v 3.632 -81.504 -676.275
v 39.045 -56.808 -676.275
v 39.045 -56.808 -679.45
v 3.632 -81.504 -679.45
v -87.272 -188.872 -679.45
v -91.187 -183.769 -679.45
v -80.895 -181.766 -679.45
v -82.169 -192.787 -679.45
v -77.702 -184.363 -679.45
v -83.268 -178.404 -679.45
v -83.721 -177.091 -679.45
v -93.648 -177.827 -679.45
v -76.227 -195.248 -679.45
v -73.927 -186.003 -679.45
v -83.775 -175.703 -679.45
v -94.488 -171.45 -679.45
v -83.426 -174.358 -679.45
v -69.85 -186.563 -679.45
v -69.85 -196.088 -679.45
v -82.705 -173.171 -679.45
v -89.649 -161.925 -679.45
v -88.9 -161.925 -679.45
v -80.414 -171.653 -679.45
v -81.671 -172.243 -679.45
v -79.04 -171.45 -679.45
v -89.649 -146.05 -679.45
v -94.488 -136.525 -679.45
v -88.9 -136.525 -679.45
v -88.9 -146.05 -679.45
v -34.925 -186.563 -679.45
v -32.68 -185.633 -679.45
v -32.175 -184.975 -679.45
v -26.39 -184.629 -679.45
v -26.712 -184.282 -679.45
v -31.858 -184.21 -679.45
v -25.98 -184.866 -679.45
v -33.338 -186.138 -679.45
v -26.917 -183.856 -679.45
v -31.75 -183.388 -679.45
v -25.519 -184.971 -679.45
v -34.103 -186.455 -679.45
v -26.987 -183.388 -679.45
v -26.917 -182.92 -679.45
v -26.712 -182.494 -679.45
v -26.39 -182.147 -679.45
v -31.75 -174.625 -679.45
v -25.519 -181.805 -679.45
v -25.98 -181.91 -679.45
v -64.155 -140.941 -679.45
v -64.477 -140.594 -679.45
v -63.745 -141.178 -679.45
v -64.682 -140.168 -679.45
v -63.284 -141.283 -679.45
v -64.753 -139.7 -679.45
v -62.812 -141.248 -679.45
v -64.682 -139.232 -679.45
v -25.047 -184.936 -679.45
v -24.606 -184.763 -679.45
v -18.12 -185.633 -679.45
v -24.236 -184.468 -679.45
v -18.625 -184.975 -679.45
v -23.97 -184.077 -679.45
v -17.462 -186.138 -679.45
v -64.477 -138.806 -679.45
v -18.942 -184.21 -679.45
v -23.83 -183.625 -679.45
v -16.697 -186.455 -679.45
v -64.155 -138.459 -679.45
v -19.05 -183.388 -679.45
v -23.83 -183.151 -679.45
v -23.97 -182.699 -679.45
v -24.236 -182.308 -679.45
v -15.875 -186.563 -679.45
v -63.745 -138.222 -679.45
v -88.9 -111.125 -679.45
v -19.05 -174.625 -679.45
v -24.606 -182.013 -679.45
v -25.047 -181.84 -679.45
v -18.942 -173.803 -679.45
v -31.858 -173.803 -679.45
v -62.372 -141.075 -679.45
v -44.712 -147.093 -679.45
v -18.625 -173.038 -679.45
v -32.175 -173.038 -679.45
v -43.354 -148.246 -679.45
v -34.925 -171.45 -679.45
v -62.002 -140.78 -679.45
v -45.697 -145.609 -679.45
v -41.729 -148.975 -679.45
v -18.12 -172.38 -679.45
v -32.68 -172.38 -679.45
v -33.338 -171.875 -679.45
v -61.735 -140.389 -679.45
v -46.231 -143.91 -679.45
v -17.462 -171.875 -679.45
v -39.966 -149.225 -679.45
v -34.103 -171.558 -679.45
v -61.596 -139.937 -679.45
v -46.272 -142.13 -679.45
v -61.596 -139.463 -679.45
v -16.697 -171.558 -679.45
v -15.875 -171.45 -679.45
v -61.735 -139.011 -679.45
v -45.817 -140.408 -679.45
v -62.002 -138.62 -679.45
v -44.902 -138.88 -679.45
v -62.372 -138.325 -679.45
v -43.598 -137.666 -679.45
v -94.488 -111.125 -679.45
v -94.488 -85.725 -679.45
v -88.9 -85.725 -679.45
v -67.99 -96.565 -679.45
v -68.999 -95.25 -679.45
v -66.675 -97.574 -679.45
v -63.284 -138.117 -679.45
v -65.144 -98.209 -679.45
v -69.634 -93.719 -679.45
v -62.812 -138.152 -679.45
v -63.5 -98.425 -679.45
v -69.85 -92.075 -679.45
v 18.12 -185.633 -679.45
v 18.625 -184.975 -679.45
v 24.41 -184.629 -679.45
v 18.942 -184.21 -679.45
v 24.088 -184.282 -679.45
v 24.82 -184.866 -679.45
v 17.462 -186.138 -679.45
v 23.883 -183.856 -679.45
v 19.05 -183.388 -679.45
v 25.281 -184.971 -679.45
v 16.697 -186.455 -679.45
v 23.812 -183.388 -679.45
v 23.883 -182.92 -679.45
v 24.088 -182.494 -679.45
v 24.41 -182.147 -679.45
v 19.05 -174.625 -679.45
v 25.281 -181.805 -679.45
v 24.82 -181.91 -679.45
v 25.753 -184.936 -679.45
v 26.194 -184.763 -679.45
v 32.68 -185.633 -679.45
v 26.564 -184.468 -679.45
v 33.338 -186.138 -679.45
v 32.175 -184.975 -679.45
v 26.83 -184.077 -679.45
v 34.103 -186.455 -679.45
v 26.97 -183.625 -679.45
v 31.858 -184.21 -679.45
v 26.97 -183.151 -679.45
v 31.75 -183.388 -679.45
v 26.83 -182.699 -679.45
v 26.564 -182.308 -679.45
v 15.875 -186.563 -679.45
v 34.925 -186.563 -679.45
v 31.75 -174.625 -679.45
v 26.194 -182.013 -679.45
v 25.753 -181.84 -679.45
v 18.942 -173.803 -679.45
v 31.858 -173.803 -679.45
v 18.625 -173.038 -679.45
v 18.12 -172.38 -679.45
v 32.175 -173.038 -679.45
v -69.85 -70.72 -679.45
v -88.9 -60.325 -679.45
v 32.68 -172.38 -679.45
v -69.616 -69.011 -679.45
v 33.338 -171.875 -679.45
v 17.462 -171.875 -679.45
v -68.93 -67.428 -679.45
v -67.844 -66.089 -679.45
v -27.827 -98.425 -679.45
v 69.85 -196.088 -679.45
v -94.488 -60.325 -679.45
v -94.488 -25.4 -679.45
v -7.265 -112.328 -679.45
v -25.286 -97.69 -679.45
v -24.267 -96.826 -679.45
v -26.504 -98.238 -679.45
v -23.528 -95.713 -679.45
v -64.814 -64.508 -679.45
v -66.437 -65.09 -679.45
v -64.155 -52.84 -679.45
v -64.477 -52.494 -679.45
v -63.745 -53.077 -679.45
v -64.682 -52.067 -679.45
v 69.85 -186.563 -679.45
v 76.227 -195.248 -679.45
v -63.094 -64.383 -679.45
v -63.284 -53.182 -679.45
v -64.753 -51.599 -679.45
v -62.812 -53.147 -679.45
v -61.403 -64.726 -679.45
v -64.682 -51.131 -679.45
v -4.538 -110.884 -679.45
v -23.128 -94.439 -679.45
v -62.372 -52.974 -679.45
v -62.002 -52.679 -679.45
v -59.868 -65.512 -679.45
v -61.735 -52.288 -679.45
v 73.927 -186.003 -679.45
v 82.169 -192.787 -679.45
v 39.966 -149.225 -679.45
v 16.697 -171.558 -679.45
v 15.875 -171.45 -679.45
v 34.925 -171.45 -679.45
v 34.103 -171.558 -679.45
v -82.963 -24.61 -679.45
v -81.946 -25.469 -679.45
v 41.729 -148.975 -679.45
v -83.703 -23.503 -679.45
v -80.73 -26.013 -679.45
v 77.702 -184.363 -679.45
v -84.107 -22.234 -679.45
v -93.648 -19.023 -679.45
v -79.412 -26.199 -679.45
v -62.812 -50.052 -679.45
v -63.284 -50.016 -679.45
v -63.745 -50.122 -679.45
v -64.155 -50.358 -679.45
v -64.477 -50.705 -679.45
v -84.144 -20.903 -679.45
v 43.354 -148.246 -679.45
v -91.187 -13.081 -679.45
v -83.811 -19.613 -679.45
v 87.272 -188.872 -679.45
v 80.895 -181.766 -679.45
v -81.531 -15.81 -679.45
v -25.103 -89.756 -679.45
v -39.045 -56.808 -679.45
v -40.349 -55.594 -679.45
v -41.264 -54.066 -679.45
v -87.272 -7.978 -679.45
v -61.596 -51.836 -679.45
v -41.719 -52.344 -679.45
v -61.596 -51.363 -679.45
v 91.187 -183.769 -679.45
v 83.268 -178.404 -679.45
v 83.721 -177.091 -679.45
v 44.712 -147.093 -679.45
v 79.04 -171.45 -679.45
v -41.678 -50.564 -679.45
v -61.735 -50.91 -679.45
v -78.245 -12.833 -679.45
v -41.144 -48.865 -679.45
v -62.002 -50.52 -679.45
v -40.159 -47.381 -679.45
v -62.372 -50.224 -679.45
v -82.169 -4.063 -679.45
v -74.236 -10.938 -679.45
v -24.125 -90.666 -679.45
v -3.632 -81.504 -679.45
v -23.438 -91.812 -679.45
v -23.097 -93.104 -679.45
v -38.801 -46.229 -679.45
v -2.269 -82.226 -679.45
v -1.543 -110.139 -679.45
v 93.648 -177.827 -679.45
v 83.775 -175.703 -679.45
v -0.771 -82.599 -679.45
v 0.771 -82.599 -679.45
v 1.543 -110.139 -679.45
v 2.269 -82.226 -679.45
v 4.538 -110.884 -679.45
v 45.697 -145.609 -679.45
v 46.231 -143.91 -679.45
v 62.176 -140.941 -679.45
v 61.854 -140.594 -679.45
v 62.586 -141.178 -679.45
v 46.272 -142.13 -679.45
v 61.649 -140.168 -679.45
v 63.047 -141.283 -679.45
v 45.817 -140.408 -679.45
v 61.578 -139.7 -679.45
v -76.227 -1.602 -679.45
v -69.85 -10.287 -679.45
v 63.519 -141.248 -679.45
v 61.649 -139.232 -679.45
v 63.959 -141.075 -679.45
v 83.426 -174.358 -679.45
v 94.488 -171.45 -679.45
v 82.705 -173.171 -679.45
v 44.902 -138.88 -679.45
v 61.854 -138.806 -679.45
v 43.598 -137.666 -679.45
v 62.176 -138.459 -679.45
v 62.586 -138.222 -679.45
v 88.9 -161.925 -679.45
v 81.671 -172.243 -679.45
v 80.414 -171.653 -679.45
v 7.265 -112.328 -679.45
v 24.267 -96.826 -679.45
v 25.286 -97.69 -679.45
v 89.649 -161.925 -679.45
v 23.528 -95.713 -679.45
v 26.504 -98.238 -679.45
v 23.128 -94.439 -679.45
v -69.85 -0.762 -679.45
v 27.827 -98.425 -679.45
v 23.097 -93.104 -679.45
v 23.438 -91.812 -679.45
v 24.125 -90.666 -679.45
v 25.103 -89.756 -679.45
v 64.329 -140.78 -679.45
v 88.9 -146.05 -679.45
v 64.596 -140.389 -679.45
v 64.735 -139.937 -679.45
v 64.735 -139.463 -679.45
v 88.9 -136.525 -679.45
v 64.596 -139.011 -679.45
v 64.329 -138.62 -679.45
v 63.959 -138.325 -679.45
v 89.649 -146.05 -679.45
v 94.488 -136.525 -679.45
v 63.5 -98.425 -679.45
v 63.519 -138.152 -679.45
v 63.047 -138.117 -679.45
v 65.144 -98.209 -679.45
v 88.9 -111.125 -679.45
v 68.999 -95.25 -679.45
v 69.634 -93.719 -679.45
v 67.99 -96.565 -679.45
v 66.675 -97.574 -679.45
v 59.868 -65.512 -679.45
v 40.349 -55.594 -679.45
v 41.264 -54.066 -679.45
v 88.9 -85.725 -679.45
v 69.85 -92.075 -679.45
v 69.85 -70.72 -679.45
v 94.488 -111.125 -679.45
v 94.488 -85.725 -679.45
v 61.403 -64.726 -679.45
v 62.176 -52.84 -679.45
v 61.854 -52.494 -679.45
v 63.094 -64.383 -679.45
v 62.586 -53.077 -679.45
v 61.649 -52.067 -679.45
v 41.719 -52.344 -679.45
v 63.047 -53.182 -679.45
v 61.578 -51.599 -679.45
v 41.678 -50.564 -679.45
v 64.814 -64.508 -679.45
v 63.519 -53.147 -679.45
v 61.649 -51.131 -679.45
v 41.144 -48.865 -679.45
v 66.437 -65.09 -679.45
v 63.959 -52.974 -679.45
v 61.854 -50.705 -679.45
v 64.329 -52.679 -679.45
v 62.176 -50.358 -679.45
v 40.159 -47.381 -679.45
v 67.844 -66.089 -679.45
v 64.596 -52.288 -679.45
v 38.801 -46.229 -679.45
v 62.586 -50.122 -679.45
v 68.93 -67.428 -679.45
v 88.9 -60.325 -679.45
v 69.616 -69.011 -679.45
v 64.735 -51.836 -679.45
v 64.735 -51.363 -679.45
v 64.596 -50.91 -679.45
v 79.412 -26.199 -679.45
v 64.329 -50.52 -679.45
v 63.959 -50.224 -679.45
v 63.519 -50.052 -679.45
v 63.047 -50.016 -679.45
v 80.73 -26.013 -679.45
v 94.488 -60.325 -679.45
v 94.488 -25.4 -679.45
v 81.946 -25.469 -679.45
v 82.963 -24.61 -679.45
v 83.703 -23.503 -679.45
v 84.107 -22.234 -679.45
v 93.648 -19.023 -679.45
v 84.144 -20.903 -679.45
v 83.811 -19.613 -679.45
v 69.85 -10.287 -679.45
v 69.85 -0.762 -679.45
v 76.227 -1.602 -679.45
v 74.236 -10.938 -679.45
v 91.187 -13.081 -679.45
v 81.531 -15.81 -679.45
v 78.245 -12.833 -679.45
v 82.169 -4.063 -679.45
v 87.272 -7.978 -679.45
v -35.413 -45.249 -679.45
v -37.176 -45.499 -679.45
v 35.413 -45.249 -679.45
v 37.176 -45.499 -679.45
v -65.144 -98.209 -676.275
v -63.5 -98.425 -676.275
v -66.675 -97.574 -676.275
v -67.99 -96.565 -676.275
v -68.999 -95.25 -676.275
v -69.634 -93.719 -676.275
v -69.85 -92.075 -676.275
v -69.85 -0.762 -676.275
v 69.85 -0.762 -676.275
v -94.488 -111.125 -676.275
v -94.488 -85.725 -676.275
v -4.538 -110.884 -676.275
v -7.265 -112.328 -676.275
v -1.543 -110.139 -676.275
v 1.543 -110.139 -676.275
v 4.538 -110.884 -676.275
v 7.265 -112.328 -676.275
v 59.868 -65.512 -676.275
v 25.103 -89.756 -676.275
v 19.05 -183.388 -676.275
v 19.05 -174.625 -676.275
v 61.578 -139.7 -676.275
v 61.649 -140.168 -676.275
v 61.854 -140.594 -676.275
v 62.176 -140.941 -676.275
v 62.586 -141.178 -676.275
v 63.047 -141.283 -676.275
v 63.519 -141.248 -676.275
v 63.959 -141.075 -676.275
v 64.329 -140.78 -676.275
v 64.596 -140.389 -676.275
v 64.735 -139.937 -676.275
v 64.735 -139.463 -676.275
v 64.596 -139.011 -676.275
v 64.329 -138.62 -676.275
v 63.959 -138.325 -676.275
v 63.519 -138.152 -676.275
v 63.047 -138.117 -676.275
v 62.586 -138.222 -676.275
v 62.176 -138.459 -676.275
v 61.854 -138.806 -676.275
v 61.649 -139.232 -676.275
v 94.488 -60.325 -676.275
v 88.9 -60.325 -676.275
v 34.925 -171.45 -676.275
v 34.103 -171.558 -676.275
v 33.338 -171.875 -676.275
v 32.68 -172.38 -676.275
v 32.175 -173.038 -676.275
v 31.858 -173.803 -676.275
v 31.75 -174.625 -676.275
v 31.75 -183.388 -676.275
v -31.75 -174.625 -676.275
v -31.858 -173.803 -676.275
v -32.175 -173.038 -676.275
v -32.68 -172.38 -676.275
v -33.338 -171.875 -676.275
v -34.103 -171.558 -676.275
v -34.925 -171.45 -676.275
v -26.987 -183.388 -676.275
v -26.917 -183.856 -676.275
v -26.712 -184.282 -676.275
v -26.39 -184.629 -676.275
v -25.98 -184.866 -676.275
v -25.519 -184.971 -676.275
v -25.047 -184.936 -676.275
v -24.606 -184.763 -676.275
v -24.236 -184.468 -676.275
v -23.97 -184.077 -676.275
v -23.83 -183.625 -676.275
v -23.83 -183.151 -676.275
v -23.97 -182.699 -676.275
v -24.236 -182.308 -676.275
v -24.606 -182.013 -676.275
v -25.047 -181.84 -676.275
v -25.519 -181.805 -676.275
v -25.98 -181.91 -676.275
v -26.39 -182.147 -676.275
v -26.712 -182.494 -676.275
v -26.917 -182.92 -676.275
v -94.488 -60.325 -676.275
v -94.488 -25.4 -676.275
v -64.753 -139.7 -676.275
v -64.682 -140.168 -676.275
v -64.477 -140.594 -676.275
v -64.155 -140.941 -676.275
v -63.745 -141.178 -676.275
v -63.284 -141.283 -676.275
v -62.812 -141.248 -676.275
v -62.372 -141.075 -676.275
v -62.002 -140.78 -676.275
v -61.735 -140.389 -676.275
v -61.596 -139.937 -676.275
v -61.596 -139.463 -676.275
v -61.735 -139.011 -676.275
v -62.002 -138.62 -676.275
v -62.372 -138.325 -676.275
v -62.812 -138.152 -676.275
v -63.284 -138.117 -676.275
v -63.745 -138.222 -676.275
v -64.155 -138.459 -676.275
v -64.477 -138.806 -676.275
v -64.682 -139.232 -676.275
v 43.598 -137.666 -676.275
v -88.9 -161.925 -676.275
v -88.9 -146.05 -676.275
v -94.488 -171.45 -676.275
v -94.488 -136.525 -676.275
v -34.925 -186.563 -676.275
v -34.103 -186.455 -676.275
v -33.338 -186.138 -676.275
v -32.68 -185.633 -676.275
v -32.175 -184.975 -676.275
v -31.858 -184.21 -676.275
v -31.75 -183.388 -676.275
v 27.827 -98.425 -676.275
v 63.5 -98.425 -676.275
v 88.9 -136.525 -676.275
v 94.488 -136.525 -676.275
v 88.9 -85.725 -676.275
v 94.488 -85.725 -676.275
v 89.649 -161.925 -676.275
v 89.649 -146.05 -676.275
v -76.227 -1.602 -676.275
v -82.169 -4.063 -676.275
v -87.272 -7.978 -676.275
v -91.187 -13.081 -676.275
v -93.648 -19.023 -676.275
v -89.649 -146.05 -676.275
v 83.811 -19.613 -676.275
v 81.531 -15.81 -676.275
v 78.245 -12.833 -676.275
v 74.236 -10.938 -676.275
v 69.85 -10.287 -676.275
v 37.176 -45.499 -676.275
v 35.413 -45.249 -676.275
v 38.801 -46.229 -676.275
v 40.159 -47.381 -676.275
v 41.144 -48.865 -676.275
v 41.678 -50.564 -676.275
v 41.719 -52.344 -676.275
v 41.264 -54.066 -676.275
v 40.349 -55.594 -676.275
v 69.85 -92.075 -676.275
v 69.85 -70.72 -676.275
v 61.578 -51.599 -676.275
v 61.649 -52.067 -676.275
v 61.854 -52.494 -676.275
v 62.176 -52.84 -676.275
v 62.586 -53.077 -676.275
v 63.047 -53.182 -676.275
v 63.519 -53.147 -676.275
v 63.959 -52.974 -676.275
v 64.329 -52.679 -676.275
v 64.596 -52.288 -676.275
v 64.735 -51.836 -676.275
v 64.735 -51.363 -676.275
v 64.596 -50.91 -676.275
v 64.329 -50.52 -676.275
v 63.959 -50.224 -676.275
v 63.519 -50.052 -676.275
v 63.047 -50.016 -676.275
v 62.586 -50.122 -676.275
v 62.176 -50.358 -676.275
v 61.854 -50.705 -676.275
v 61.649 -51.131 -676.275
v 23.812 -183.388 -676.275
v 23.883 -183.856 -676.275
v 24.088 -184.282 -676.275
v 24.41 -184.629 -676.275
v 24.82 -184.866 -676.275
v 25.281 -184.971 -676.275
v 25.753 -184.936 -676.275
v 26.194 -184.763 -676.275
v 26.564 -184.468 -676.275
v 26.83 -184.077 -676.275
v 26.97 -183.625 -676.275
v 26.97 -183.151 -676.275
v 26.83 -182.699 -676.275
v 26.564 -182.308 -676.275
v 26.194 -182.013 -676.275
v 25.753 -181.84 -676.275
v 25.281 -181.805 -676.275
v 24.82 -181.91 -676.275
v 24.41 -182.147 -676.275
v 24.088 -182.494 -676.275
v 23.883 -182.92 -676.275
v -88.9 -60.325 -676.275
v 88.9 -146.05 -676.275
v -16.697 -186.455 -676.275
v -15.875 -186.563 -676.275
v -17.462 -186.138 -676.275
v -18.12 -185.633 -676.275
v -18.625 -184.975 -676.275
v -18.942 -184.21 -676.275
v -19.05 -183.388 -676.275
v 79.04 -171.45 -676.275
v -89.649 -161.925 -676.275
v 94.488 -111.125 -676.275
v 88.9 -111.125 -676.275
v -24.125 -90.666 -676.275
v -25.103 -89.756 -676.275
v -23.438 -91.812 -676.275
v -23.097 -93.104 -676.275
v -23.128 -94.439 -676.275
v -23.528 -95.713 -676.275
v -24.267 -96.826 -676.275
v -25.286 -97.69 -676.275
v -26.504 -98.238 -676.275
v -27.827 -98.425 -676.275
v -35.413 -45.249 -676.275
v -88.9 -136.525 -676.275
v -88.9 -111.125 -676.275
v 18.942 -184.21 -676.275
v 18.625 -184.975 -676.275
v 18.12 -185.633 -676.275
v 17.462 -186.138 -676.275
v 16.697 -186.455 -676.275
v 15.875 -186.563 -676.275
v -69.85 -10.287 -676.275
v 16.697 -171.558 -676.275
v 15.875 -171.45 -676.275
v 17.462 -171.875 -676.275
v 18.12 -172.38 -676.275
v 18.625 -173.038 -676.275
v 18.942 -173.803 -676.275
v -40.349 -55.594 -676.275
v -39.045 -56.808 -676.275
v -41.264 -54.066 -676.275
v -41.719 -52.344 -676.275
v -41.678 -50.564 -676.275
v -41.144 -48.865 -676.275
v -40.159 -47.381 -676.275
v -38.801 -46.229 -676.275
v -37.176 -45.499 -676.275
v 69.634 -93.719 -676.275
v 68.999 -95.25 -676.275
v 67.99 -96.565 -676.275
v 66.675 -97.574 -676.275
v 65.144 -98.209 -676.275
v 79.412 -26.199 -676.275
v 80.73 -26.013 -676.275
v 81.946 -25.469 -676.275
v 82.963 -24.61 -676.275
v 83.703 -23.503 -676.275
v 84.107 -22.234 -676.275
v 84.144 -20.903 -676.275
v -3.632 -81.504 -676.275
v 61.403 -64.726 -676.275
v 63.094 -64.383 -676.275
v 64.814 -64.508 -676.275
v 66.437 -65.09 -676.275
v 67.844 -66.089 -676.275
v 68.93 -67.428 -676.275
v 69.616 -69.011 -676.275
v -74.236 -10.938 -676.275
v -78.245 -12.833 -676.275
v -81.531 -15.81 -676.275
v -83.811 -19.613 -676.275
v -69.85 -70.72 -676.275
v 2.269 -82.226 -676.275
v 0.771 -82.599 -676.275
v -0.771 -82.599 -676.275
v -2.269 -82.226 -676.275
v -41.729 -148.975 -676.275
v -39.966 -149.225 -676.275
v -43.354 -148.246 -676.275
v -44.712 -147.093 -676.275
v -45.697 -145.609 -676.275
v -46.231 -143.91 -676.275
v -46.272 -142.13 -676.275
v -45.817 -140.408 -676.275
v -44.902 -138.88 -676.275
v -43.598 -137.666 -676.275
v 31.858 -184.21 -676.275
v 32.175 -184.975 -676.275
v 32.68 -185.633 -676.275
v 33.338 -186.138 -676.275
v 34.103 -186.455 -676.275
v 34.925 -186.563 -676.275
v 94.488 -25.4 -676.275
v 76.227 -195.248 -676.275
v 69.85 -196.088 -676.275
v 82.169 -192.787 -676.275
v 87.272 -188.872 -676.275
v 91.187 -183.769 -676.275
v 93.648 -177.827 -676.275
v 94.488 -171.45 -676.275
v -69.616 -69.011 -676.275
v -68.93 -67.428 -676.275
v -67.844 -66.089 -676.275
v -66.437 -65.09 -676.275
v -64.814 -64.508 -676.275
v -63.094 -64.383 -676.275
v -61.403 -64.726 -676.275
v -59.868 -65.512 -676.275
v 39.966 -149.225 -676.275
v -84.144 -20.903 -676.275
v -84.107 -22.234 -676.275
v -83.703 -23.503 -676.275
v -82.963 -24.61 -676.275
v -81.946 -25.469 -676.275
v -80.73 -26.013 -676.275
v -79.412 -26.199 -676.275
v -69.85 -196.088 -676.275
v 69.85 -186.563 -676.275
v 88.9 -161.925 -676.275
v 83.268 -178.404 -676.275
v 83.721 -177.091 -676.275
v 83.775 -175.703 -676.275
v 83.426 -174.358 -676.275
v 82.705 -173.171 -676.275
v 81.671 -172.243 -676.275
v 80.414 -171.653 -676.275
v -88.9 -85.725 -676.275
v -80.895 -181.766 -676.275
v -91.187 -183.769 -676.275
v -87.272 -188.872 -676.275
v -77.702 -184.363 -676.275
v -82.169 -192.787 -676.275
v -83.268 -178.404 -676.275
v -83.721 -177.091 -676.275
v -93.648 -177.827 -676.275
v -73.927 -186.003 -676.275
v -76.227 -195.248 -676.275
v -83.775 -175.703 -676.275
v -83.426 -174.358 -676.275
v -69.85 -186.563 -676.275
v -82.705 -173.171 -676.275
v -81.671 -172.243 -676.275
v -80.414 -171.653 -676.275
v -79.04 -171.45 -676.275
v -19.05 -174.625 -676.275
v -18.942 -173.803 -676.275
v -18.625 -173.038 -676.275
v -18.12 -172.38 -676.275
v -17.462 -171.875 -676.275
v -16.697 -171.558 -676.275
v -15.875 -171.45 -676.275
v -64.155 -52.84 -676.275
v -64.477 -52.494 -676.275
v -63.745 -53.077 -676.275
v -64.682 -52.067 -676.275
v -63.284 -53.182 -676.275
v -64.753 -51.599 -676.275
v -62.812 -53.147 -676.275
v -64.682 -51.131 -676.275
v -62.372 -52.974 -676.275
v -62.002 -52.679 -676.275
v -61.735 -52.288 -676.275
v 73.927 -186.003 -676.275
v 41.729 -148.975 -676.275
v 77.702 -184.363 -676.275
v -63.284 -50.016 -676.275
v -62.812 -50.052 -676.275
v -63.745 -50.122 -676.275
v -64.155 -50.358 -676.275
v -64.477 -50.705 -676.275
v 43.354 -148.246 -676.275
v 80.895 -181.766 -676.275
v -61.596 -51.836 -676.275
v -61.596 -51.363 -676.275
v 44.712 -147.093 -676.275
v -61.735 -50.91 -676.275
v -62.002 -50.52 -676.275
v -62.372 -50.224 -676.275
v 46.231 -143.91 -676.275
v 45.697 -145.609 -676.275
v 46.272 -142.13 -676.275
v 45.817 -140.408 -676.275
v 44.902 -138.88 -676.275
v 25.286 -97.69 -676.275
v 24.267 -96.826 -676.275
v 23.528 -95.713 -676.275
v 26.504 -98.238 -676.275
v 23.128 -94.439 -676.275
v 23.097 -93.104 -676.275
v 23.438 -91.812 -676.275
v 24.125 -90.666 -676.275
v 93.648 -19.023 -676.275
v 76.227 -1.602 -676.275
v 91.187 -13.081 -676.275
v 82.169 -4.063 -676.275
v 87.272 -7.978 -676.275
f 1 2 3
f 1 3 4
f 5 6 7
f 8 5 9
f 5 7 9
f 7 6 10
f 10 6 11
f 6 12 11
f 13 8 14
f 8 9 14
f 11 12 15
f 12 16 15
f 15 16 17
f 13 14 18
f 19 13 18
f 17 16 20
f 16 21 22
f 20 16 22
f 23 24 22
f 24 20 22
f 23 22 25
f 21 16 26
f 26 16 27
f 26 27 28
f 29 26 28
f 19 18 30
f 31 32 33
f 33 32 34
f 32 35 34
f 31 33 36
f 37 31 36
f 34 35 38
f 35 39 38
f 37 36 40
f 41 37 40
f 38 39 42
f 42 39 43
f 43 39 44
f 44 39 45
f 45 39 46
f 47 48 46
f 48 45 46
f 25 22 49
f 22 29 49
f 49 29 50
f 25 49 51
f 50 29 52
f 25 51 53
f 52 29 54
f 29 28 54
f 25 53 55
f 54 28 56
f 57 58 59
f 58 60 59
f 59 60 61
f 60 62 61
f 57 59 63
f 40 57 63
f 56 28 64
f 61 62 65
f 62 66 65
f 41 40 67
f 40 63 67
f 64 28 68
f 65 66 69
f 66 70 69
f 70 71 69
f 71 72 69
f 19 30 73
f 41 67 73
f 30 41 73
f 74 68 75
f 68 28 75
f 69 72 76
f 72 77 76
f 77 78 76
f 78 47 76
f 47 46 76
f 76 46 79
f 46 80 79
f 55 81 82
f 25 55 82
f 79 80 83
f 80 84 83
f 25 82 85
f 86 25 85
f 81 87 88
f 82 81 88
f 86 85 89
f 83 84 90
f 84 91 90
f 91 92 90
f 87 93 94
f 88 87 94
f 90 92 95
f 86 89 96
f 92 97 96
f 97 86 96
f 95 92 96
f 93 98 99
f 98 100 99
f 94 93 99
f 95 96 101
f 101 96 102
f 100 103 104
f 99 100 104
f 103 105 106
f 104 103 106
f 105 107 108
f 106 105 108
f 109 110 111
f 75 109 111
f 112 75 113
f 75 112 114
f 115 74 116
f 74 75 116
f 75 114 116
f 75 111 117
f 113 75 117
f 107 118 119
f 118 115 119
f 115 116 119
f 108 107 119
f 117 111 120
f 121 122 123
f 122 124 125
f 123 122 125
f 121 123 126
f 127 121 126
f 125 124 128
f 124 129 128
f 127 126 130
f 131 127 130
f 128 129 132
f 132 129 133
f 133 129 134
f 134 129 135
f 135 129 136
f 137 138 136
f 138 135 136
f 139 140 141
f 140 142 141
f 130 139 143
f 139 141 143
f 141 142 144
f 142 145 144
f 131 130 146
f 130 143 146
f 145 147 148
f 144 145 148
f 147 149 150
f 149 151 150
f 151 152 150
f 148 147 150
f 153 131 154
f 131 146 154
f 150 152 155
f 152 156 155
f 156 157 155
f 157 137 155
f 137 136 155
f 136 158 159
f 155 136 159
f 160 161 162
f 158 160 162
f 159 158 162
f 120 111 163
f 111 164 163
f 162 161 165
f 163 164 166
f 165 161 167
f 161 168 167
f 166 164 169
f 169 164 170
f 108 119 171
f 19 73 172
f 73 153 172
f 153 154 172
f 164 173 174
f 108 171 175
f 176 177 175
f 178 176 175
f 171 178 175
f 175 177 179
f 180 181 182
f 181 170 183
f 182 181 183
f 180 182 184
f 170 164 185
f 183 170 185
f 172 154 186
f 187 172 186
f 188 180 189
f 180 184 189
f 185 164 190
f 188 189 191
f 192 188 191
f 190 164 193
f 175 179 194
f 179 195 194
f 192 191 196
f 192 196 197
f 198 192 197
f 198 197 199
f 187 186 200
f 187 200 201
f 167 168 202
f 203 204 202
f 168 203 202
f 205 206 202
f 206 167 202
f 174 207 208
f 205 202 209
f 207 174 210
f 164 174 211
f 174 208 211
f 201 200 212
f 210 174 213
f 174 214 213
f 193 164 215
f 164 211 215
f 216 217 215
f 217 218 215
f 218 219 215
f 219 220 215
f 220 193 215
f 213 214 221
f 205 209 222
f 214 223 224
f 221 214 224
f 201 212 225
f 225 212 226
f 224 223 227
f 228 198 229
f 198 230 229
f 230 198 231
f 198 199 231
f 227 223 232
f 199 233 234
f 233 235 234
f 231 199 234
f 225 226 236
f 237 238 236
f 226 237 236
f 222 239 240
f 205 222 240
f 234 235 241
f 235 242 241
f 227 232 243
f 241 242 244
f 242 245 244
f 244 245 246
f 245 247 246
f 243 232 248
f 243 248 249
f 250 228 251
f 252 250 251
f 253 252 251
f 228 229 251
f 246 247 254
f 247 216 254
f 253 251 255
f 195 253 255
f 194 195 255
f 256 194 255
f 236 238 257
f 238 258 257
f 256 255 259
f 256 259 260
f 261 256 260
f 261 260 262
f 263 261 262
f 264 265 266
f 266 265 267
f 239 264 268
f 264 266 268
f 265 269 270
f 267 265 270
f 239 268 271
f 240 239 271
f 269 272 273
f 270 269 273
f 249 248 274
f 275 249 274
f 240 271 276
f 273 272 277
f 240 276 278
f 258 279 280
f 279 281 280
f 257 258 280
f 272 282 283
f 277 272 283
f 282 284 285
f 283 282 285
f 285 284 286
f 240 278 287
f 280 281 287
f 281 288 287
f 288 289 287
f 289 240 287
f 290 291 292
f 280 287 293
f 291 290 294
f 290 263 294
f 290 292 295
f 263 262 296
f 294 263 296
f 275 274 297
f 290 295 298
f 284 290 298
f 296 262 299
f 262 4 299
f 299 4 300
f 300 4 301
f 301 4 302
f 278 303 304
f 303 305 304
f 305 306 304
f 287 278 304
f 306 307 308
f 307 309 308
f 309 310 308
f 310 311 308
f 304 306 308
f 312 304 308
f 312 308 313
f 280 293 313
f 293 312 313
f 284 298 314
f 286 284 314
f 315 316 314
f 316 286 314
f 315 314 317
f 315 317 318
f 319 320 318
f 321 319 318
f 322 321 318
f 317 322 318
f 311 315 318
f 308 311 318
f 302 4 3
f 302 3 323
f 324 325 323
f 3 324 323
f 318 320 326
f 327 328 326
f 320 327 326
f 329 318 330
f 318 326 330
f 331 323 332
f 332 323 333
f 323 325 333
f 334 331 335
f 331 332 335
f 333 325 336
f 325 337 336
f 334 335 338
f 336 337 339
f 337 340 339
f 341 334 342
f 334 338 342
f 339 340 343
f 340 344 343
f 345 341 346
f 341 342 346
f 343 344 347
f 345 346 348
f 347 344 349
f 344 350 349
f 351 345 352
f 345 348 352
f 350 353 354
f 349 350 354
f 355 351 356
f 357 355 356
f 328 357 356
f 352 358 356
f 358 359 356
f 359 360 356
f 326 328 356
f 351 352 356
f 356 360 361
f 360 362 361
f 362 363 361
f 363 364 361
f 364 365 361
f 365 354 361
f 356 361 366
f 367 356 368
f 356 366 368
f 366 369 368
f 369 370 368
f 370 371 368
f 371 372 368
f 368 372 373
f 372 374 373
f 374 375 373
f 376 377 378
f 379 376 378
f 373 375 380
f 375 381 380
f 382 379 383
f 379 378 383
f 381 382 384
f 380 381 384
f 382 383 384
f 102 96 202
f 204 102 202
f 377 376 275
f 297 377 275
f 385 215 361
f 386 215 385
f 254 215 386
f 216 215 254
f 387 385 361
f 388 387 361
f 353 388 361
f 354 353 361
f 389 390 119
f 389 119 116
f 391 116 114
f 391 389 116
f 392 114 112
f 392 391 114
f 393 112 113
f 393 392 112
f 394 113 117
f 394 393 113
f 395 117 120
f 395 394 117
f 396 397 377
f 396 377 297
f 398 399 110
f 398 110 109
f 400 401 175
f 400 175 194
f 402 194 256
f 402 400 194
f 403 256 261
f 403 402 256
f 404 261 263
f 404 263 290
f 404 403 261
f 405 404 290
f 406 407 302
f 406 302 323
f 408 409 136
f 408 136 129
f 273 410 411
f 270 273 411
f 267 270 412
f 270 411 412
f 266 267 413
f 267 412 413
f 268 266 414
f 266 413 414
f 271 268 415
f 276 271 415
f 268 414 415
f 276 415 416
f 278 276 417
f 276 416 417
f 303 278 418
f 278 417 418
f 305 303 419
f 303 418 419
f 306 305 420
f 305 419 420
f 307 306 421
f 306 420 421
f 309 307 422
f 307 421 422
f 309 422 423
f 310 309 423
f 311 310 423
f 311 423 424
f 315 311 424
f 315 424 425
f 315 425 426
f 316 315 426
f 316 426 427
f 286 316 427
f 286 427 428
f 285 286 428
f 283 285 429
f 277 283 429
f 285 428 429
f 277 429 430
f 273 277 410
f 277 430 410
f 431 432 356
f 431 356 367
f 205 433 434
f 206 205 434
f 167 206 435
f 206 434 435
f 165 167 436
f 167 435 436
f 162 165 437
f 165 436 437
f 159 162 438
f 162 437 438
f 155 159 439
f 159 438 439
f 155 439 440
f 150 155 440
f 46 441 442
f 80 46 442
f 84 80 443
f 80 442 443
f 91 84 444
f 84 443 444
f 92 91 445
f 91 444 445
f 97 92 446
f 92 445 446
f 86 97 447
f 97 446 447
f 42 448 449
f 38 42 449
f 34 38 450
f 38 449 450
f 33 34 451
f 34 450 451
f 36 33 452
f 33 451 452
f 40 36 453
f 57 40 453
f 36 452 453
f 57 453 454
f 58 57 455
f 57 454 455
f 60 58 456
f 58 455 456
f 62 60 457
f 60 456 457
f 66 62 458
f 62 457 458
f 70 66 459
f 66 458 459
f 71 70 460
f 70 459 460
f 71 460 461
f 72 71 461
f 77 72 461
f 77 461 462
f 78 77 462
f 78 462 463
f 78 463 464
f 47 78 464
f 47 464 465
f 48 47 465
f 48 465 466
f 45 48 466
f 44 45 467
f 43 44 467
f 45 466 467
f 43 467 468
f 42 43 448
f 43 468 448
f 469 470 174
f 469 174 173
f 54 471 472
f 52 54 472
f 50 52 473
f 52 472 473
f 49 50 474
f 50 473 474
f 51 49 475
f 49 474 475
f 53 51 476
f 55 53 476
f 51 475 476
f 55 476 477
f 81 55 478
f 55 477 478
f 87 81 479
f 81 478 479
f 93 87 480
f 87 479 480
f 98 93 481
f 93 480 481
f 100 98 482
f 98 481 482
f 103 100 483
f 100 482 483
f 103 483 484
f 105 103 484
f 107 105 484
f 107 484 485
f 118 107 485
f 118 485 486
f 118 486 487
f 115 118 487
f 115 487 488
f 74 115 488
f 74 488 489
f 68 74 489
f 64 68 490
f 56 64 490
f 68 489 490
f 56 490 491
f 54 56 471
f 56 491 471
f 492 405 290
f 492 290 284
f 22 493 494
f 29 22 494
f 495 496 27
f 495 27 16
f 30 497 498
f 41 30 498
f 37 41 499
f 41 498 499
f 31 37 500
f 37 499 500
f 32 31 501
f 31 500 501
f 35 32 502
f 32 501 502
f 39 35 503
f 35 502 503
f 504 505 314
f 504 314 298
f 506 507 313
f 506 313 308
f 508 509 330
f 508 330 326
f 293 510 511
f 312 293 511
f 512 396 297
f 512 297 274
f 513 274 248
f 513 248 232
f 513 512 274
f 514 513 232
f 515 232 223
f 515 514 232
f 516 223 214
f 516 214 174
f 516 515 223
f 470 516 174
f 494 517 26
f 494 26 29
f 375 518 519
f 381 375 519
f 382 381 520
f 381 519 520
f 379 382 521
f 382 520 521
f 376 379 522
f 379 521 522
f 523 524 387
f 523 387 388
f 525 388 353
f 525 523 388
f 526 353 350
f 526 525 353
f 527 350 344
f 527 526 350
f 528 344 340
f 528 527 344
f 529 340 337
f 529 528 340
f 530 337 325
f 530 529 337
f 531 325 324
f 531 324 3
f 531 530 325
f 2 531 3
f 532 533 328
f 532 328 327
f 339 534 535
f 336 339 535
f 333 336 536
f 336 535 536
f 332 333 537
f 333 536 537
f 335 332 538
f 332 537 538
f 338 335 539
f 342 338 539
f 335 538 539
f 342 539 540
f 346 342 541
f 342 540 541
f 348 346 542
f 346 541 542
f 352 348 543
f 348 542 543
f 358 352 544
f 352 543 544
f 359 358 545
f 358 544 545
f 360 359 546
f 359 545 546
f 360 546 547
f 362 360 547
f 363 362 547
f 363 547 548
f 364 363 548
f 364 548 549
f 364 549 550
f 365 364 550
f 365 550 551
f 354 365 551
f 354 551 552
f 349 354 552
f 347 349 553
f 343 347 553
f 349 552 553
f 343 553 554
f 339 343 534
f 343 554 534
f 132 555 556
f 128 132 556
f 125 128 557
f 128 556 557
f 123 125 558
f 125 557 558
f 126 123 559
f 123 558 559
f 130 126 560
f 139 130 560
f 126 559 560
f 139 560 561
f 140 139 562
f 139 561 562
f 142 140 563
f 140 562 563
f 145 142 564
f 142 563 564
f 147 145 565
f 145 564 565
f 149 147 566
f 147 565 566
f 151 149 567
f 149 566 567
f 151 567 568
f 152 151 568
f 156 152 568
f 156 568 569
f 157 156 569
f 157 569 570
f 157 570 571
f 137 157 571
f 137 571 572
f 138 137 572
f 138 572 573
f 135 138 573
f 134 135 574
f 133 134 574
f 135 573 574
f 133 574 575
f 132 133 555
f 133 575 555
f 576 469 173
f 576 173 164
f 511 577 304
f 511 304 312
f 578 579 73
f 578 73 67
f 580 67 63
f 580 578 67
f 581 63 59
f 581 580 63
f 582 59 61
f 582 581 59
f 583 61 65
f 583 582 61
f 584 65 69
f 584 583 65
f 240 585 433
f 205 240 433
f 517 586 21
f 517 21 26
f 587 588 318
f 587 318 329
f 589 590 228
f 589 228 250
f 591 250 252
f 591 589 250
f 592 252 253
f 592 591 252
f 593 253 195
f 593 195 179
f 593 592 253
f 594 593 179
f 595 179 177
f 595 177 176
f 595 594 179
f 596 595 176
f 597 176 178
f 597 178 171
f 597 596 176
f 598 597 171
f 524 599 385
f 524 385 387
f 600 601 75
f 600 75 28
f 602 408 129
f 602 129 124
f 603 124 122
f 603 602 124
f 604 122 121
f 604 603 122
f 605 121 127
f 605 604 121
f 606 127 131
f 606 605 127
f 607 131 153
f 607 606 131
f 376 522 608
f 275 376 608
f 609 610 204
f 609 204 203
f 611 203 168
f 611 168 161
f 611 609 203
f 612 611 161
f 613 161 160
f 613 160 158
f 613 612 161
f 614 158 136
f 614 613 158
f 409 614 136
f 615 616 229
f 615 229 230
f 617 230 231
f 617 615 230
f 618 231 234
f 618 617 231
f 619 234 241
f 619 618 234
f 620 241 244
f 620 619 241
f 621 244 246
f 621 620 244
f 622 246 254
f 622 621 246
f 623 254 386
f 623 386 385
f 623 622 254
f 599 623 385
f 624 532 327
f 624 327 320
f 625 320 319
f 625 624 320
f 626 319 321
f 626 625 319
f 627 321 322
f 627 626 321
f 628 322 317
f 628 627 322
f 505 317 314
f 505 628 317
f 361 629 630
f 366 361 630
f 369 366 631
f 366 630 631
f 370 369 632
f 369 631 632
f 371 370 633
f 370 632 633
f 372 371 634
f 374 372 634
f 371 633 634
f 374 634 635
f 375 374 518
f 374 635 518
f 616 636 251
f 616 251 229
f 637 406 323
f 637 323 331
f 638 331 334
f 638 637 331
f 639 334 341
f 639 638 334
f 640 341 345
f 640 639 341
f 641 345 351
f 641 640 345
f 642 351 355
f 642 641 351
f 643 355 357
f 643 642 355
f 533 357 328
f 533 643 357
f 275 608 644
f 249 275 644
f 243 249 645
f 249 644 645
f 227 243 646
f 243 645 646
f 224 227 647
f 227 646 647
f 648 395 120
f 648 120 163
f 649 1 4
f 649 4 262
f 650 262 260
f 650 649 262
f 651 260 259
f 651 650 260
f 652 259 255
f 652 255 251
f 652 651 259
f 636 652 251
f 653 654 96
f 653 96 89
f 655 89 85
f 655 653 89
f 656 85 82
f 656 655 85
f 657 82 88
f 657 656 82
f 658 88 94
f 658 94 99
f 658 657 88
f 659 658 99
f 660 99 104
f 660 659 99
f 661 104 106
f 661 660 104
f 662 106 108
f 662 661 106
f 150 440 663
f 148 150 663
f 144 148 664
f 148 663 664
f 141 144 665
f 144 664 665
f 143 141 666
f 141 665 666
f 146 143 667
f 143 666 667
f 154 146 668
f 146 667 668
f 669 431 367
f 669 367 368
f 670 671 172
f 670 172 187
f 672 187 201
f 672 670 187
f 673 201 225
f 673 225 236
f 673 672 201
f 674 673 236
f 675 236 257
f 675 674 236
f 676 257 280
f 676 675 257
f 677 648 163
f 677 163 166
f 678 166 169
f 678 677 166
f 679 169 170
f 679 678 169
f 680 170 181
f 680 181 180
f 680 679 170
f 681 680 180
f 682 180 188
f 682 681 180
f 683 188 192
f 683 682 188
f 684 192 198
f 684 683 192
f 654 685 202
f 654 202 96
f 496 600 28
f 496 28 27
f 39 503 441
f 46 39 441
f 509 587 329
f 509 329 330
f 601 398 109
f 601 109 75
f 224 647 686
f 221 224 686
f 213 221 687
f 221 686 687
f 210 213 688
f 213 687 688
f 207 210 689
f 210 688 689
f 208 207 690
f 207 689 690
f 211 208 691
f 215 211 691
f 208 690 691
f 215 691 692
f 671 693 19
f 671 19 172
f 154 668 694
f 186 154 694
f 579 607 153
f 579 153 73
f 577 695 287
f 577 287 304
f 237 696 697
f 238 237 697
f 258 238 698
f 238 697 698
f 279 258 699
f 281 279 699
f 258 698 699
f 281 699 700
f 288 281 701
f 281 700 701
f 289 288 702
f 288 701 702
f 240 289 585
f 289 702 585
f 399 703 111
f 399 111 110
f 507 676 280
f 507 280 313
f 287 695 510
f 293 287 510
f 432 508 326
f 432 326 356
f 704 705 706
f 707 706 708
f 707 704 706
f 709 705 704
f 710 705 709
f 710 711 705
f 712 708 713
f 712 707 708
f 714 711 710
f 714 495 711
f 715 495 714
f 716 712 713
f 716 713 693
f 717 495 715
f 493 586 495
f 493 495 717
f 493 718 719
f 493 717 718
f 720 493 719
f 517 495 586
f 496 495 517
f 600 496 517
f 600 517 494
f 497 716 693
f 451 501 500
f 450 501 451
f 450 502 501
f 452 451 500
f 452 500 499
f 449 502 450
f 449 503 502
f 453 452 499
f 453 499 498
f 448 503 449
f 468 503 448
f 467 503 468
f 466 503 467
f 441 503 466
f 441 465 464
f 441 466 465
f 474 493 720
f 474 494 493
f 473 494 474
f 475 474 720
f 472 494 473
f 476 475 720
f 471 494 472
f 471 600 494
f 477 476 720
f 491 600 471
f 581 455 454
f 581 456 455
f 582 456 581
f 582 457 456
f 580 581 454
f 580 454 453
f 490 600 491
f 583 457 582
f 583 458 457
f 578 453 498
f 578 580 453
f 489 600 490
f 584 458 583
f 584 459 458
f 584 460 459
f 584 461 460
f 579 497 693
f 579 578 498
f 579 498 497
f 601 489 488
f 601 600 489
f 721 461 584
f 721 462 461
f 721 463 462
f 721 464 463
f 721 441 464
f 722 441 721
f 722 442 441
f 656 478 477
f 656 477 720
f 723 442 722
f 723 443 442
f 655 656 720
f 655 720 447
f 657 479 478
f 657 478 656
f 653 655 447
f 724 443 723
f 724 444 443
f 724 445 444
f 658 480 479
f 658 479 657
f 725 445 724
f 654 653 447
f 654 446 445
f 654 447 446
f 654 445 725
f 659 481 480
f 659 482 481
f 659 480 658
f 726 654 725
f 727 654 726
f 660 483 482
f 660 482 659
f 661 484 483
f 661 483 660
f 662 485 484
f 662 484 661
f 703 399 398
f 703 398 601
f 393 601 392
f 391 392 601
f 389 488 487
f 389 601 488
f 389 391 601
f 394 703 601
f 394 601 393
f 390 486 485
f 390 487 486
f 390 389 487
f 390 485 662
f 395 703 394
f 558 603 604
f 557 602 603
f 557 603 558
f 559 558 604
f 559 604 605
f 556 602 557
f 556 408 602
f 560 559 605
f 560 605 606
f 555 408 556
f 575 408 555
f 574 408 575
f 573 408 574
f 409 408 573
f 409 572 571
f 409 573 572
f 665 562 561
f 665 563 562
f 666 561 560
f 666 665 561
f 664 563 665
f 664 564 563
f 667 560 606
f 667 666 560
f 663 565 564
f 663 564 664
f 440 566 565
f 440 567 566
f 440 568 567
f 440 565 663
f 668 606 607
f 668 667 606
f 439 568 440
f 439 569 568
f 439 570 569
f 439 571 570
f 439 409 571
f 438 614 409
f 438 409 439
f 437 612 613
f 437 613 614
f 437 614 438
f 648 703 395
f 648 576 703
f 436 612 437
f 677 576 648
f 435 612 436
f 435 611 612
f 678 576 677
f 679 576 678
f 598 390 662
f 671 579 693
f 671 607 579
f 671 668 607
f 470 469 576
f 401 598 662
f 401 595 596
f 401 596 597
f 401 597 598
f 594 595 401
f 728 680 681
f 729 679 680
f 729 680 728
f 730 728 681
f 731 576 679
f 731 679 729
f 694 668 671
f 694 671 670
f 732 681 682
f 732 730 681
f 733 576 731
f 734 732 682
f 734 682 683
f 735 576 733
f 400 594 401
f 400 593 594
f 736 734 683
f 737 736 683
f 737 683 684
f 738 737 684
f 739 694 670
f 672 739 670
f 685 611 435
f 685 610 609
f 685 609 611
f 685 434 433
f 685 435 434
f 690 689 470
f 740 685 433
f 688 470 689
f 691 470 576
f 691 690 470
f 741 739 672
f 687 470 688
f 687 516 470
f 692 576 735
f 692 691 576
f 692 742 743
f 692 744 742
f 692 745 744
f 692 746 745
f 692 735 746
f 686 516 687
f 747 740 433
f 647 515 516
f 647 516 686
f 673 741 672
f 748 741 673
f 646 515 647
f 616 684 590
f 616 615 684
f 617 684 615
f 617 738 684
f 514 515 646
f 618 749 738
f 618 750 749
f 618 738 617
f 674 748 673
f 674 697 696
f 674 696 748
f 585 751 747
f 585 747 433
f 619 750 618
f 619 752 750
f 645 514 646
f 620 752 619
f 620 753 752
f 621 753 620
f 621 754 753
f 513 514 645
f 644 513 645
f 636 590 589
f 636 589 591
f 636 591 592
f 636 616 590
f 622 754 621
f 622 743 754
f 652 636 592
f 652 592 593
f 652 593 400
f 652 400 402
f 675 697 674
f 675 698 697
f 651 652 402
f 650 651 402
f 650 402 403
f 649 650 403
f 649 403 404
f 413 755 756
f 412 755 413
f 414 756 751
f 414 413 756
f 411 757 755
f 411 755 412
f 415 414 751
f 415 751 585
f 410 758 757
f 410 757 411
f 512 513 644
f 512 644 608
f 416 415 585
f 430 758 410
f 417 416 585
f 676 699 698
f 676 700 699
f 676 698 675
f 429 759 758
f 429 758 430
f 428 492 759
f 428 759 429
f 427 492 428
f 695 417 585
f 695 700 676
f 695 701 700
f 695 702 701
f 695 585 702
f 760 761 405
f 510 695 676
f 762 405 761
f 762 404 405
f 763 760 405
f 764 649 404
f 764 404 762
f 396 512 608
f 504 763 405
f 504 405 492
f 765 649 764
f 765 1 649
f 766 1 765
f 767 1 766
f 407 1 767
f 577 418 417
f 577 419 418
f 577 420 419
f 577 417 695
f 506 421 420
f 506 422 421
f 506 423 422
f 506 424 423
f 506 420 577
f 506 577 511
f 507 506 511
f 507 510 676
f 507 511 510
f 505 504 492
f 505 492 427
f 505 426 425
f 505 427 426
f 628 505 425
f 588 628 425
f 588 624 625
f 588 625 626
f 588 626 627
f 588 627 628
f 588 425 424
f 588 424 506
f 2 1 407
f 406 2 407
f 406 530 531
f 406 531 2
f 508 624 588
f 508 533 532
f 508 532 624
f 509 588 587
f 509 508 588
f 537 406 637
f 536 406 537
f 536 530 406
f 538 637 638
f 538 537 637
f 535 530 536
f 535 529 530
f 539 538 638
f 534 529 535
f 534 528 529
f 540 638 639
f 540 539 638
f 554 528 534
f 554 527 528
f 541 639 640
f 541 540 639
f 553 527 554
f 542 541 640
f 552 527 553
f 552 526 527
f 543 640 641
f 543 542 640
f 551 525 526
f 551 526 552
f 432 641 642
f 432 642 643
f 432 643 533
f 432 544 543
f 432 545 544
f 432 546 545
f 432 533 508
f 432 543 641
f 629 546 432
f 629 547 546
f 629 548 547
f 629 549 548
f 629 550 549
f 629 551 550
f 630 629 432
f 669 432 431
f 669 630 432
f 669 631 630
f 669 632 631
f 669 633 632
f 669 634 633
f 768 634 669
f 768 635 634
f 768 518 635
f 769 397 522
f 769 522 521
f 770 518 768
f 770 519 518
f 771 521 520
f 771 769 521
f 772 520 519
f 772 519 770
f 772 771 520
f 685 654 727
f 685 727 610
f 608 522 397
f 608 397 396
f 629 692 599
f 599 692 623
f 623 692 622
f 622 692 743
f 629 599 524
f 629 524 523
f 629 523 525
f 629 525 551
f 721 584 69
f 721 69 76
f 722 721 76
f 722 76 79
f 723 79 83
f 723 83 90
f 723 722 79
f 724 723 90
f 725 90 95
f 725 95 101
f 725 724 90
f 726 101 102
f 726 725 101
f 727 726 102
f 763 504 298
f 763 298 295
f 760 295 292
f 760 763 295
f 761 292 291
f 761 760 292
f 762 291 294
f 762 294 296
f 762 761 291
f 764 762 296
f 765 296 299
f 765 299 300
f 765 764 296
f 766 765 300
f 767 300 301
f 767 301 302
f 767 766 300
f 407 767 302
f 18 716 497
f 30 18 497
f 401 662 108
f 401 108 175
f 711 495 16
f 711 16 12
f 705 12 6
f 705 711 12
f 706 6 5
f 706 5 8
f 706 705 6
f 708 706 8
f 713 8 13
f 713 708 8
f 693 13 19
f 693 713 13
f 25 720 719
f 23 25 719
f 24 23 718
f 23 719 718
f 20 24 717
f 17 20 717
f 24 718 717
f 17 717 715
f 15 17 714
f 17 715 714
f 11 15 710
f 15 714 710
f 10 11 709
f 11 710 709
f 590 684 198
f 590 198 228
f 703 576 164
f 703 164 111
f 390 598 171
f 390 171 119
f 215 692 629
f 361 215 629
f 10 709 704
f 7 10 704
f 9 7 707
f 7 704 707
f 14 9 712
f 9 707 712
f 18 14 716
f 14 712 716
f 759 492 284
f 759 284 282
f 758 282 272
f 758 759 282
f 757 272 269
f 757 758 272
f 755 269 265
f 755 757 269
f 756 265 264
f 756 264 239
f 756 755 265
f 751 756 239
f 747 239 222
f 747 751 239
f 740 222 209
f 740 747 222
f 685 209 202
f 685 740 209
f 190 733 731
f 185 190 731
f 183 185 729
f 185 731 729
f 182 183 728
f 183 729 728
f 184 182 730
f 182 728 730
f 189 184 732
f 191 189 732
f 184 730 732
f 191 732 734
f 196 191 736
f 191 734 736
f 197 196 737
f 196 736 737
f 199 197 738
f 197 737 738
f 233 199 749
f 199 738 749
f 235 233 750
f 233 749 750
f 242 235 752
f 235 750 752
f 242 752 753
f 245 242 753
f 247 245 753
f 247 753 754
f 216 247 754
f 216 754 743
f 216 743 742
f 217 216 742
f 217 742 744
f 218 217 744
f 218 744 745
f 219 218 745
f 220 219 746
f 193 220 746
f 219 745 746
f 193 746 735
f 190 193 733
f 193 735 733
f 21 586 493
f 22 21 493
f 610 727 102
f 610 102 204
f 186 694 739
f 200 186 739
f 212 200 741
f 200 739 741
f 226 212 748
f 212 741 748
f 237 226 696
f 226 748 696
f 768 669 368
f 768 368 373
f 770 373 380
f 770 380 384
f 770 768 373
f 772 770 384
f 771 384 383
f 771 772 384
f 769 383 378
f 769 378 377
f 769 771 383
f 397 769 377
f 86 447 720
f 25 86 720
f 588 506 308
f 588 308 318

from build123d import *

# Parameters (mm, degrees)
SKETCH1_R           = 1.5875
SKETCH1_W           = 0.7493
SKETCH1_H           = 15.875
BOSS_EXTRUDE1_DEPTH = 3.175


with BuildPart() as part:
    # Sketch1 → Boss-Extrude1 (new body)
    with BuildSketch(Plane.XY.offset(-676.275)):
        with BuildLine():
            Line((94.488, -171.45), (94.488, -136.525))
            Line((94.488, -136.525), (88.9, -136.525))
            Line((88.9, -136.525), (88.9, -111.125))
            Line((88.9, -111.125), (94.488, -111.125))
            Line((94.488, -111.125), (94.488, -85.725))
            Line((94.488, -85.725), (88.9, -85.725))
            Line((88.9, -85.725), (88.9, -60.325))
            Line((88.9, -60.325), (94.488, -60.325))
            Line((94.488, -60.325), (94.488, -25.4))
            ThreePointArc((94.488, -25.4), (87.271696875, -7.978303125), (69.85, -0.762))
            Line((69.85, -0.762), (-69.85, -0.762))
            ThreePointArc((-69.85, -0.762), (-87.271696875, -7.978303125), (-94.488, -25.4))
            Line((-94.488, -25.4), (-94.488, -60.325))
            Line((-94.488, -60.325), (-88.9, -60.325))
            Line((-88.9, -60.325), (-88.9, -85.725))
            Line((-88.9, -85.725), (-94.488, -85.725))
            Line((-94.488, -85.725), (-94.488, -111.125))
            Line((-94.488, -111.125), (-88.9, -111.125))
            Line((-88.9, -111.125), (-88.9, -136.525))
            Line((-88.9, -136.525), (-94.488, -136.525))
            Line((-94.488, -136.525), (-94.488, -171.45))
            ThreePointArc((-94.488, -171.45), (-87.271696875, -188.871696875), (-69.85, -196.088))
            Line((-69.85, -196.088), (69.85, -196.088))
            ThreePointArc((69.85, -196.088), (87.271696875, -188.871696875), (94.488, -171.45))
        make_face()
        with Locations(Location((63.1655201, -139.7, 0), (0, 0, 180))):
            Circle(SKETCH1_R, mode=Mode.SUBTRACT)
        with Locations(Location((-63.1655201, -51.5992872, 0), (0, 0, 180))):
            Circle(SKETCH1_R, mode=Mode.SUBTRACT)
        with Locations(Location((25.4, -183.388, 0), (0, 0, 180))):
            Circle(SKETCH1_R, mode=Mode.SUBTRACT)
        with Locations(Location((-25.4, -183.388, 0), (0, 0, 180))):
            Circle(SKETCH1_R, mode=Mode.SUBTRACT)
        with Locations(Location((-63.1655201, -139.7, 0), (0, 0, 180))):
            Circle(SKETCH1_R, mode=Mode.SUBTRACT)
        with Locations(Location((63.1655201, -51.5992872, 0), (0, 0, 180))):
            Circle(SKETCH1_R, mode=Mode.SUBTRACT)
        with BuildLine():
            Line((7.264641701, -112.328307791), (43.598023874, -137.666473794))
            ThreePointArc((43.598023874, -137.666473794), (46.023616914, -144.778727737), (39.965703023, -149.225))
            Line((39.965703023, -149.225), (-39.965703023, -149.225))
            ThreePointArc((-39.965703023, -149.225), (-46.023616914, -144.778727737), (-43.598023874, -137.666473794))
            Line((-43.598023874, -137.666473794), (-7.264641701, -112.328307791))
            ThreePointArc((-7.264641701, -112.328307791), (0, -110.045360203), (7.264641701, -112.328307791))
        make_face(mode=Mode.SUBTRACT)
        with BuildLine():
            Line((39.04526783, -56.807813406), (3.632320851, -81.504086518))
            ThreePointArc((3.632320851, -81.504086518), (0, -82.645560312), (-3.632320851, -81.504086518))
            Line((-3.632320851, -81.504086518), (-39.04526783, -56.807813406))
            ThreePointArc((-39.04526783, -56.807813406), (-41.47086087, -49.695559463), (-35.41294698, -45.2492872))
            Line((-35.41294698, -45.2492872), (35.41294698, -45.2492872))
            ThreePointArc((35.41294698, -45.2492872), (41.47086087, -49.695559463), (39.04526783, -56.807813406))
        make_face(mode=Mode.SUBTRACT)
        with BuildLine():
            Line((69.85, -70.72011097), (69.85, -92.075))
            ThreePointArc((69.85, -92.075), (67.990128061, -96.565128061), (63.5, -98.425))
            Line((63.5, -98.425), (27.826758339, -98.425))
            ThreePointArc((27.826758339, -98.425), (23.283322921, -95.090295803), (25.102517701, -89.756105345))
            Line((25.102517701, -89.756105345), (59.867679149, -65.511584764))
            ThreePointArc((59.867679149, -65.511584764), (66.4374532, -65.090380186), (69.85, -70.72011097))
        make_face(mode=Mode.SUBTRACT)
        with BuildLine():
            Line((-59.867679149, -65.511584764), (-25.102517701, -89.756105345))
            ThreePointArc((-25.102517701, -89.756105345), (-23.283322921, -95.090295803), (-27.826758339, -98.425))
            Line((-27.826758339, -98.425), (-63.5, -98.425))
            ThreePointArc((-63.5, -98.425), (-67.990128061, -96.565128061), (-69.85, -92.075))
            Line((-69.85, -92.075), (-69.85, -70.72011097))
            ThreePointArc((-69.85, -70.72011097), (-66.4374532, -65.090380186), (-59.867679149, -65.511584764))
        make_face(mode=Mode.SUBTRACT)
        with BuildLine():
            Line((-69.85, -186.563), (-34.925, -186.563))
            ThreePointArc((-34.925, -186.563), (-32.67993597, -185.63306403), (-31.75, -183.388))
            Line((-31.75, -183.388), (-31.75, -174.625))
            ThreePointArc((-31.75, -174.625), (-32.67993597, -172.37993597), (-34.925, -171.45))
            Line((-34.925, -171.45), (-79.039746678, -171.45))
            ThreePointArc((-79.039746678, -171.45), (-83.108999442, -173.738113573), (-83.268157726, -178.403834356))
            ThreePointArc((-83.268157726, -178.403834356), (-77.702052928, -184.363095439), (-69.85, -186.563))
        make_face(mode=Mode.SUBTRACT)
        with BuildLine():
            Line((69.85, -10.287), (-69.85, -10.287))
            ThreePointArc((-69.85, -10.287), (-78.244855824, -12.833012903), (-83.811231367, -19.613223028))
            ThreePointArc((-83.811231367, -19.613223028), (-83.371868677, -24.08222496), (-79.411683667, -26.1992872))
            Line((-79.411683667, -26.1992872), (79.411683667, -26.1992872))
            ThreePointArc((79.411683667, -26.1992872), (83.371868677, -24.08222496), (83.811231367, -19.613223028))
            ThreePointArc((83.811231367, -19.613223028), (78.244855824, -12.833012903), (69.85, -10.287))
        make_face(mode=Mode.SUBTRACT)
        with BuildLine():
            Line((-19.05, -183.388), (-19.05, -174.625))
            ThreePointArc((-19.05, -174.625), (-18.12006403, -172.37993597), (-15.875, -171.45))
            Line((-15.875, -171.45), (15.875, -171.45))
            ThreePointArc((15.875, -171.45), (18.12006403, -172.37993597), (19.05, -174.625))
            Line((19.05, -174.625), (19.05, -183.388))
            ThreePointArc((19.05, -183.388), (18.12006403, -185.63306403), (15.875, -186.563))
            Line((15.875, -186.563), (-15.875, -186.563))
            ThreePointArc((-15.875, -186.563), (-18.12006403, -185.63306403), (-19.05, -183.388))
        make_face(mode=Mode.SUBTRACT)
        with BuildLine():
            Line((31.75, -174.625), (31.75, -183.388))
            ThreePointArc((31.75, -183.388), (32.67993597, -185.63306403), (34.925, -186.563))
            Line((34.925, -186.563), (69.85, -186.563))
            ThreePointArc((69.85, -186.563), (77.702052928, -184.363095439), (83.268157726, -178.403834356))
            ThreePointArc((83.268157726, -178.403834356), (83.108999442, -173.738113573), (79.039746678, -171.45))
            Line((79.039746678, -171.45), (34.925, -171.45))
            ThreePointArc((34.925, -171.45), (32.67993597, -172.37993597), (31.75, -174.625))
        make_face(mode=Mode.SUBTRACT)
        with Locations((-89.27465, -153.9875)):
            Rectangle(SKETCH1_W, SKETCH1_H, mode=Mode.SUBTRACT)
        with Locations((89.27465, -153.9875)):
            Rectangle(SKETCH1_W, SKETCH1_H, mode=Mode.SUBTRACT)
    extrude(amount=-BOSS_EXTRUDE1_DEPTH)


solid = part.part
